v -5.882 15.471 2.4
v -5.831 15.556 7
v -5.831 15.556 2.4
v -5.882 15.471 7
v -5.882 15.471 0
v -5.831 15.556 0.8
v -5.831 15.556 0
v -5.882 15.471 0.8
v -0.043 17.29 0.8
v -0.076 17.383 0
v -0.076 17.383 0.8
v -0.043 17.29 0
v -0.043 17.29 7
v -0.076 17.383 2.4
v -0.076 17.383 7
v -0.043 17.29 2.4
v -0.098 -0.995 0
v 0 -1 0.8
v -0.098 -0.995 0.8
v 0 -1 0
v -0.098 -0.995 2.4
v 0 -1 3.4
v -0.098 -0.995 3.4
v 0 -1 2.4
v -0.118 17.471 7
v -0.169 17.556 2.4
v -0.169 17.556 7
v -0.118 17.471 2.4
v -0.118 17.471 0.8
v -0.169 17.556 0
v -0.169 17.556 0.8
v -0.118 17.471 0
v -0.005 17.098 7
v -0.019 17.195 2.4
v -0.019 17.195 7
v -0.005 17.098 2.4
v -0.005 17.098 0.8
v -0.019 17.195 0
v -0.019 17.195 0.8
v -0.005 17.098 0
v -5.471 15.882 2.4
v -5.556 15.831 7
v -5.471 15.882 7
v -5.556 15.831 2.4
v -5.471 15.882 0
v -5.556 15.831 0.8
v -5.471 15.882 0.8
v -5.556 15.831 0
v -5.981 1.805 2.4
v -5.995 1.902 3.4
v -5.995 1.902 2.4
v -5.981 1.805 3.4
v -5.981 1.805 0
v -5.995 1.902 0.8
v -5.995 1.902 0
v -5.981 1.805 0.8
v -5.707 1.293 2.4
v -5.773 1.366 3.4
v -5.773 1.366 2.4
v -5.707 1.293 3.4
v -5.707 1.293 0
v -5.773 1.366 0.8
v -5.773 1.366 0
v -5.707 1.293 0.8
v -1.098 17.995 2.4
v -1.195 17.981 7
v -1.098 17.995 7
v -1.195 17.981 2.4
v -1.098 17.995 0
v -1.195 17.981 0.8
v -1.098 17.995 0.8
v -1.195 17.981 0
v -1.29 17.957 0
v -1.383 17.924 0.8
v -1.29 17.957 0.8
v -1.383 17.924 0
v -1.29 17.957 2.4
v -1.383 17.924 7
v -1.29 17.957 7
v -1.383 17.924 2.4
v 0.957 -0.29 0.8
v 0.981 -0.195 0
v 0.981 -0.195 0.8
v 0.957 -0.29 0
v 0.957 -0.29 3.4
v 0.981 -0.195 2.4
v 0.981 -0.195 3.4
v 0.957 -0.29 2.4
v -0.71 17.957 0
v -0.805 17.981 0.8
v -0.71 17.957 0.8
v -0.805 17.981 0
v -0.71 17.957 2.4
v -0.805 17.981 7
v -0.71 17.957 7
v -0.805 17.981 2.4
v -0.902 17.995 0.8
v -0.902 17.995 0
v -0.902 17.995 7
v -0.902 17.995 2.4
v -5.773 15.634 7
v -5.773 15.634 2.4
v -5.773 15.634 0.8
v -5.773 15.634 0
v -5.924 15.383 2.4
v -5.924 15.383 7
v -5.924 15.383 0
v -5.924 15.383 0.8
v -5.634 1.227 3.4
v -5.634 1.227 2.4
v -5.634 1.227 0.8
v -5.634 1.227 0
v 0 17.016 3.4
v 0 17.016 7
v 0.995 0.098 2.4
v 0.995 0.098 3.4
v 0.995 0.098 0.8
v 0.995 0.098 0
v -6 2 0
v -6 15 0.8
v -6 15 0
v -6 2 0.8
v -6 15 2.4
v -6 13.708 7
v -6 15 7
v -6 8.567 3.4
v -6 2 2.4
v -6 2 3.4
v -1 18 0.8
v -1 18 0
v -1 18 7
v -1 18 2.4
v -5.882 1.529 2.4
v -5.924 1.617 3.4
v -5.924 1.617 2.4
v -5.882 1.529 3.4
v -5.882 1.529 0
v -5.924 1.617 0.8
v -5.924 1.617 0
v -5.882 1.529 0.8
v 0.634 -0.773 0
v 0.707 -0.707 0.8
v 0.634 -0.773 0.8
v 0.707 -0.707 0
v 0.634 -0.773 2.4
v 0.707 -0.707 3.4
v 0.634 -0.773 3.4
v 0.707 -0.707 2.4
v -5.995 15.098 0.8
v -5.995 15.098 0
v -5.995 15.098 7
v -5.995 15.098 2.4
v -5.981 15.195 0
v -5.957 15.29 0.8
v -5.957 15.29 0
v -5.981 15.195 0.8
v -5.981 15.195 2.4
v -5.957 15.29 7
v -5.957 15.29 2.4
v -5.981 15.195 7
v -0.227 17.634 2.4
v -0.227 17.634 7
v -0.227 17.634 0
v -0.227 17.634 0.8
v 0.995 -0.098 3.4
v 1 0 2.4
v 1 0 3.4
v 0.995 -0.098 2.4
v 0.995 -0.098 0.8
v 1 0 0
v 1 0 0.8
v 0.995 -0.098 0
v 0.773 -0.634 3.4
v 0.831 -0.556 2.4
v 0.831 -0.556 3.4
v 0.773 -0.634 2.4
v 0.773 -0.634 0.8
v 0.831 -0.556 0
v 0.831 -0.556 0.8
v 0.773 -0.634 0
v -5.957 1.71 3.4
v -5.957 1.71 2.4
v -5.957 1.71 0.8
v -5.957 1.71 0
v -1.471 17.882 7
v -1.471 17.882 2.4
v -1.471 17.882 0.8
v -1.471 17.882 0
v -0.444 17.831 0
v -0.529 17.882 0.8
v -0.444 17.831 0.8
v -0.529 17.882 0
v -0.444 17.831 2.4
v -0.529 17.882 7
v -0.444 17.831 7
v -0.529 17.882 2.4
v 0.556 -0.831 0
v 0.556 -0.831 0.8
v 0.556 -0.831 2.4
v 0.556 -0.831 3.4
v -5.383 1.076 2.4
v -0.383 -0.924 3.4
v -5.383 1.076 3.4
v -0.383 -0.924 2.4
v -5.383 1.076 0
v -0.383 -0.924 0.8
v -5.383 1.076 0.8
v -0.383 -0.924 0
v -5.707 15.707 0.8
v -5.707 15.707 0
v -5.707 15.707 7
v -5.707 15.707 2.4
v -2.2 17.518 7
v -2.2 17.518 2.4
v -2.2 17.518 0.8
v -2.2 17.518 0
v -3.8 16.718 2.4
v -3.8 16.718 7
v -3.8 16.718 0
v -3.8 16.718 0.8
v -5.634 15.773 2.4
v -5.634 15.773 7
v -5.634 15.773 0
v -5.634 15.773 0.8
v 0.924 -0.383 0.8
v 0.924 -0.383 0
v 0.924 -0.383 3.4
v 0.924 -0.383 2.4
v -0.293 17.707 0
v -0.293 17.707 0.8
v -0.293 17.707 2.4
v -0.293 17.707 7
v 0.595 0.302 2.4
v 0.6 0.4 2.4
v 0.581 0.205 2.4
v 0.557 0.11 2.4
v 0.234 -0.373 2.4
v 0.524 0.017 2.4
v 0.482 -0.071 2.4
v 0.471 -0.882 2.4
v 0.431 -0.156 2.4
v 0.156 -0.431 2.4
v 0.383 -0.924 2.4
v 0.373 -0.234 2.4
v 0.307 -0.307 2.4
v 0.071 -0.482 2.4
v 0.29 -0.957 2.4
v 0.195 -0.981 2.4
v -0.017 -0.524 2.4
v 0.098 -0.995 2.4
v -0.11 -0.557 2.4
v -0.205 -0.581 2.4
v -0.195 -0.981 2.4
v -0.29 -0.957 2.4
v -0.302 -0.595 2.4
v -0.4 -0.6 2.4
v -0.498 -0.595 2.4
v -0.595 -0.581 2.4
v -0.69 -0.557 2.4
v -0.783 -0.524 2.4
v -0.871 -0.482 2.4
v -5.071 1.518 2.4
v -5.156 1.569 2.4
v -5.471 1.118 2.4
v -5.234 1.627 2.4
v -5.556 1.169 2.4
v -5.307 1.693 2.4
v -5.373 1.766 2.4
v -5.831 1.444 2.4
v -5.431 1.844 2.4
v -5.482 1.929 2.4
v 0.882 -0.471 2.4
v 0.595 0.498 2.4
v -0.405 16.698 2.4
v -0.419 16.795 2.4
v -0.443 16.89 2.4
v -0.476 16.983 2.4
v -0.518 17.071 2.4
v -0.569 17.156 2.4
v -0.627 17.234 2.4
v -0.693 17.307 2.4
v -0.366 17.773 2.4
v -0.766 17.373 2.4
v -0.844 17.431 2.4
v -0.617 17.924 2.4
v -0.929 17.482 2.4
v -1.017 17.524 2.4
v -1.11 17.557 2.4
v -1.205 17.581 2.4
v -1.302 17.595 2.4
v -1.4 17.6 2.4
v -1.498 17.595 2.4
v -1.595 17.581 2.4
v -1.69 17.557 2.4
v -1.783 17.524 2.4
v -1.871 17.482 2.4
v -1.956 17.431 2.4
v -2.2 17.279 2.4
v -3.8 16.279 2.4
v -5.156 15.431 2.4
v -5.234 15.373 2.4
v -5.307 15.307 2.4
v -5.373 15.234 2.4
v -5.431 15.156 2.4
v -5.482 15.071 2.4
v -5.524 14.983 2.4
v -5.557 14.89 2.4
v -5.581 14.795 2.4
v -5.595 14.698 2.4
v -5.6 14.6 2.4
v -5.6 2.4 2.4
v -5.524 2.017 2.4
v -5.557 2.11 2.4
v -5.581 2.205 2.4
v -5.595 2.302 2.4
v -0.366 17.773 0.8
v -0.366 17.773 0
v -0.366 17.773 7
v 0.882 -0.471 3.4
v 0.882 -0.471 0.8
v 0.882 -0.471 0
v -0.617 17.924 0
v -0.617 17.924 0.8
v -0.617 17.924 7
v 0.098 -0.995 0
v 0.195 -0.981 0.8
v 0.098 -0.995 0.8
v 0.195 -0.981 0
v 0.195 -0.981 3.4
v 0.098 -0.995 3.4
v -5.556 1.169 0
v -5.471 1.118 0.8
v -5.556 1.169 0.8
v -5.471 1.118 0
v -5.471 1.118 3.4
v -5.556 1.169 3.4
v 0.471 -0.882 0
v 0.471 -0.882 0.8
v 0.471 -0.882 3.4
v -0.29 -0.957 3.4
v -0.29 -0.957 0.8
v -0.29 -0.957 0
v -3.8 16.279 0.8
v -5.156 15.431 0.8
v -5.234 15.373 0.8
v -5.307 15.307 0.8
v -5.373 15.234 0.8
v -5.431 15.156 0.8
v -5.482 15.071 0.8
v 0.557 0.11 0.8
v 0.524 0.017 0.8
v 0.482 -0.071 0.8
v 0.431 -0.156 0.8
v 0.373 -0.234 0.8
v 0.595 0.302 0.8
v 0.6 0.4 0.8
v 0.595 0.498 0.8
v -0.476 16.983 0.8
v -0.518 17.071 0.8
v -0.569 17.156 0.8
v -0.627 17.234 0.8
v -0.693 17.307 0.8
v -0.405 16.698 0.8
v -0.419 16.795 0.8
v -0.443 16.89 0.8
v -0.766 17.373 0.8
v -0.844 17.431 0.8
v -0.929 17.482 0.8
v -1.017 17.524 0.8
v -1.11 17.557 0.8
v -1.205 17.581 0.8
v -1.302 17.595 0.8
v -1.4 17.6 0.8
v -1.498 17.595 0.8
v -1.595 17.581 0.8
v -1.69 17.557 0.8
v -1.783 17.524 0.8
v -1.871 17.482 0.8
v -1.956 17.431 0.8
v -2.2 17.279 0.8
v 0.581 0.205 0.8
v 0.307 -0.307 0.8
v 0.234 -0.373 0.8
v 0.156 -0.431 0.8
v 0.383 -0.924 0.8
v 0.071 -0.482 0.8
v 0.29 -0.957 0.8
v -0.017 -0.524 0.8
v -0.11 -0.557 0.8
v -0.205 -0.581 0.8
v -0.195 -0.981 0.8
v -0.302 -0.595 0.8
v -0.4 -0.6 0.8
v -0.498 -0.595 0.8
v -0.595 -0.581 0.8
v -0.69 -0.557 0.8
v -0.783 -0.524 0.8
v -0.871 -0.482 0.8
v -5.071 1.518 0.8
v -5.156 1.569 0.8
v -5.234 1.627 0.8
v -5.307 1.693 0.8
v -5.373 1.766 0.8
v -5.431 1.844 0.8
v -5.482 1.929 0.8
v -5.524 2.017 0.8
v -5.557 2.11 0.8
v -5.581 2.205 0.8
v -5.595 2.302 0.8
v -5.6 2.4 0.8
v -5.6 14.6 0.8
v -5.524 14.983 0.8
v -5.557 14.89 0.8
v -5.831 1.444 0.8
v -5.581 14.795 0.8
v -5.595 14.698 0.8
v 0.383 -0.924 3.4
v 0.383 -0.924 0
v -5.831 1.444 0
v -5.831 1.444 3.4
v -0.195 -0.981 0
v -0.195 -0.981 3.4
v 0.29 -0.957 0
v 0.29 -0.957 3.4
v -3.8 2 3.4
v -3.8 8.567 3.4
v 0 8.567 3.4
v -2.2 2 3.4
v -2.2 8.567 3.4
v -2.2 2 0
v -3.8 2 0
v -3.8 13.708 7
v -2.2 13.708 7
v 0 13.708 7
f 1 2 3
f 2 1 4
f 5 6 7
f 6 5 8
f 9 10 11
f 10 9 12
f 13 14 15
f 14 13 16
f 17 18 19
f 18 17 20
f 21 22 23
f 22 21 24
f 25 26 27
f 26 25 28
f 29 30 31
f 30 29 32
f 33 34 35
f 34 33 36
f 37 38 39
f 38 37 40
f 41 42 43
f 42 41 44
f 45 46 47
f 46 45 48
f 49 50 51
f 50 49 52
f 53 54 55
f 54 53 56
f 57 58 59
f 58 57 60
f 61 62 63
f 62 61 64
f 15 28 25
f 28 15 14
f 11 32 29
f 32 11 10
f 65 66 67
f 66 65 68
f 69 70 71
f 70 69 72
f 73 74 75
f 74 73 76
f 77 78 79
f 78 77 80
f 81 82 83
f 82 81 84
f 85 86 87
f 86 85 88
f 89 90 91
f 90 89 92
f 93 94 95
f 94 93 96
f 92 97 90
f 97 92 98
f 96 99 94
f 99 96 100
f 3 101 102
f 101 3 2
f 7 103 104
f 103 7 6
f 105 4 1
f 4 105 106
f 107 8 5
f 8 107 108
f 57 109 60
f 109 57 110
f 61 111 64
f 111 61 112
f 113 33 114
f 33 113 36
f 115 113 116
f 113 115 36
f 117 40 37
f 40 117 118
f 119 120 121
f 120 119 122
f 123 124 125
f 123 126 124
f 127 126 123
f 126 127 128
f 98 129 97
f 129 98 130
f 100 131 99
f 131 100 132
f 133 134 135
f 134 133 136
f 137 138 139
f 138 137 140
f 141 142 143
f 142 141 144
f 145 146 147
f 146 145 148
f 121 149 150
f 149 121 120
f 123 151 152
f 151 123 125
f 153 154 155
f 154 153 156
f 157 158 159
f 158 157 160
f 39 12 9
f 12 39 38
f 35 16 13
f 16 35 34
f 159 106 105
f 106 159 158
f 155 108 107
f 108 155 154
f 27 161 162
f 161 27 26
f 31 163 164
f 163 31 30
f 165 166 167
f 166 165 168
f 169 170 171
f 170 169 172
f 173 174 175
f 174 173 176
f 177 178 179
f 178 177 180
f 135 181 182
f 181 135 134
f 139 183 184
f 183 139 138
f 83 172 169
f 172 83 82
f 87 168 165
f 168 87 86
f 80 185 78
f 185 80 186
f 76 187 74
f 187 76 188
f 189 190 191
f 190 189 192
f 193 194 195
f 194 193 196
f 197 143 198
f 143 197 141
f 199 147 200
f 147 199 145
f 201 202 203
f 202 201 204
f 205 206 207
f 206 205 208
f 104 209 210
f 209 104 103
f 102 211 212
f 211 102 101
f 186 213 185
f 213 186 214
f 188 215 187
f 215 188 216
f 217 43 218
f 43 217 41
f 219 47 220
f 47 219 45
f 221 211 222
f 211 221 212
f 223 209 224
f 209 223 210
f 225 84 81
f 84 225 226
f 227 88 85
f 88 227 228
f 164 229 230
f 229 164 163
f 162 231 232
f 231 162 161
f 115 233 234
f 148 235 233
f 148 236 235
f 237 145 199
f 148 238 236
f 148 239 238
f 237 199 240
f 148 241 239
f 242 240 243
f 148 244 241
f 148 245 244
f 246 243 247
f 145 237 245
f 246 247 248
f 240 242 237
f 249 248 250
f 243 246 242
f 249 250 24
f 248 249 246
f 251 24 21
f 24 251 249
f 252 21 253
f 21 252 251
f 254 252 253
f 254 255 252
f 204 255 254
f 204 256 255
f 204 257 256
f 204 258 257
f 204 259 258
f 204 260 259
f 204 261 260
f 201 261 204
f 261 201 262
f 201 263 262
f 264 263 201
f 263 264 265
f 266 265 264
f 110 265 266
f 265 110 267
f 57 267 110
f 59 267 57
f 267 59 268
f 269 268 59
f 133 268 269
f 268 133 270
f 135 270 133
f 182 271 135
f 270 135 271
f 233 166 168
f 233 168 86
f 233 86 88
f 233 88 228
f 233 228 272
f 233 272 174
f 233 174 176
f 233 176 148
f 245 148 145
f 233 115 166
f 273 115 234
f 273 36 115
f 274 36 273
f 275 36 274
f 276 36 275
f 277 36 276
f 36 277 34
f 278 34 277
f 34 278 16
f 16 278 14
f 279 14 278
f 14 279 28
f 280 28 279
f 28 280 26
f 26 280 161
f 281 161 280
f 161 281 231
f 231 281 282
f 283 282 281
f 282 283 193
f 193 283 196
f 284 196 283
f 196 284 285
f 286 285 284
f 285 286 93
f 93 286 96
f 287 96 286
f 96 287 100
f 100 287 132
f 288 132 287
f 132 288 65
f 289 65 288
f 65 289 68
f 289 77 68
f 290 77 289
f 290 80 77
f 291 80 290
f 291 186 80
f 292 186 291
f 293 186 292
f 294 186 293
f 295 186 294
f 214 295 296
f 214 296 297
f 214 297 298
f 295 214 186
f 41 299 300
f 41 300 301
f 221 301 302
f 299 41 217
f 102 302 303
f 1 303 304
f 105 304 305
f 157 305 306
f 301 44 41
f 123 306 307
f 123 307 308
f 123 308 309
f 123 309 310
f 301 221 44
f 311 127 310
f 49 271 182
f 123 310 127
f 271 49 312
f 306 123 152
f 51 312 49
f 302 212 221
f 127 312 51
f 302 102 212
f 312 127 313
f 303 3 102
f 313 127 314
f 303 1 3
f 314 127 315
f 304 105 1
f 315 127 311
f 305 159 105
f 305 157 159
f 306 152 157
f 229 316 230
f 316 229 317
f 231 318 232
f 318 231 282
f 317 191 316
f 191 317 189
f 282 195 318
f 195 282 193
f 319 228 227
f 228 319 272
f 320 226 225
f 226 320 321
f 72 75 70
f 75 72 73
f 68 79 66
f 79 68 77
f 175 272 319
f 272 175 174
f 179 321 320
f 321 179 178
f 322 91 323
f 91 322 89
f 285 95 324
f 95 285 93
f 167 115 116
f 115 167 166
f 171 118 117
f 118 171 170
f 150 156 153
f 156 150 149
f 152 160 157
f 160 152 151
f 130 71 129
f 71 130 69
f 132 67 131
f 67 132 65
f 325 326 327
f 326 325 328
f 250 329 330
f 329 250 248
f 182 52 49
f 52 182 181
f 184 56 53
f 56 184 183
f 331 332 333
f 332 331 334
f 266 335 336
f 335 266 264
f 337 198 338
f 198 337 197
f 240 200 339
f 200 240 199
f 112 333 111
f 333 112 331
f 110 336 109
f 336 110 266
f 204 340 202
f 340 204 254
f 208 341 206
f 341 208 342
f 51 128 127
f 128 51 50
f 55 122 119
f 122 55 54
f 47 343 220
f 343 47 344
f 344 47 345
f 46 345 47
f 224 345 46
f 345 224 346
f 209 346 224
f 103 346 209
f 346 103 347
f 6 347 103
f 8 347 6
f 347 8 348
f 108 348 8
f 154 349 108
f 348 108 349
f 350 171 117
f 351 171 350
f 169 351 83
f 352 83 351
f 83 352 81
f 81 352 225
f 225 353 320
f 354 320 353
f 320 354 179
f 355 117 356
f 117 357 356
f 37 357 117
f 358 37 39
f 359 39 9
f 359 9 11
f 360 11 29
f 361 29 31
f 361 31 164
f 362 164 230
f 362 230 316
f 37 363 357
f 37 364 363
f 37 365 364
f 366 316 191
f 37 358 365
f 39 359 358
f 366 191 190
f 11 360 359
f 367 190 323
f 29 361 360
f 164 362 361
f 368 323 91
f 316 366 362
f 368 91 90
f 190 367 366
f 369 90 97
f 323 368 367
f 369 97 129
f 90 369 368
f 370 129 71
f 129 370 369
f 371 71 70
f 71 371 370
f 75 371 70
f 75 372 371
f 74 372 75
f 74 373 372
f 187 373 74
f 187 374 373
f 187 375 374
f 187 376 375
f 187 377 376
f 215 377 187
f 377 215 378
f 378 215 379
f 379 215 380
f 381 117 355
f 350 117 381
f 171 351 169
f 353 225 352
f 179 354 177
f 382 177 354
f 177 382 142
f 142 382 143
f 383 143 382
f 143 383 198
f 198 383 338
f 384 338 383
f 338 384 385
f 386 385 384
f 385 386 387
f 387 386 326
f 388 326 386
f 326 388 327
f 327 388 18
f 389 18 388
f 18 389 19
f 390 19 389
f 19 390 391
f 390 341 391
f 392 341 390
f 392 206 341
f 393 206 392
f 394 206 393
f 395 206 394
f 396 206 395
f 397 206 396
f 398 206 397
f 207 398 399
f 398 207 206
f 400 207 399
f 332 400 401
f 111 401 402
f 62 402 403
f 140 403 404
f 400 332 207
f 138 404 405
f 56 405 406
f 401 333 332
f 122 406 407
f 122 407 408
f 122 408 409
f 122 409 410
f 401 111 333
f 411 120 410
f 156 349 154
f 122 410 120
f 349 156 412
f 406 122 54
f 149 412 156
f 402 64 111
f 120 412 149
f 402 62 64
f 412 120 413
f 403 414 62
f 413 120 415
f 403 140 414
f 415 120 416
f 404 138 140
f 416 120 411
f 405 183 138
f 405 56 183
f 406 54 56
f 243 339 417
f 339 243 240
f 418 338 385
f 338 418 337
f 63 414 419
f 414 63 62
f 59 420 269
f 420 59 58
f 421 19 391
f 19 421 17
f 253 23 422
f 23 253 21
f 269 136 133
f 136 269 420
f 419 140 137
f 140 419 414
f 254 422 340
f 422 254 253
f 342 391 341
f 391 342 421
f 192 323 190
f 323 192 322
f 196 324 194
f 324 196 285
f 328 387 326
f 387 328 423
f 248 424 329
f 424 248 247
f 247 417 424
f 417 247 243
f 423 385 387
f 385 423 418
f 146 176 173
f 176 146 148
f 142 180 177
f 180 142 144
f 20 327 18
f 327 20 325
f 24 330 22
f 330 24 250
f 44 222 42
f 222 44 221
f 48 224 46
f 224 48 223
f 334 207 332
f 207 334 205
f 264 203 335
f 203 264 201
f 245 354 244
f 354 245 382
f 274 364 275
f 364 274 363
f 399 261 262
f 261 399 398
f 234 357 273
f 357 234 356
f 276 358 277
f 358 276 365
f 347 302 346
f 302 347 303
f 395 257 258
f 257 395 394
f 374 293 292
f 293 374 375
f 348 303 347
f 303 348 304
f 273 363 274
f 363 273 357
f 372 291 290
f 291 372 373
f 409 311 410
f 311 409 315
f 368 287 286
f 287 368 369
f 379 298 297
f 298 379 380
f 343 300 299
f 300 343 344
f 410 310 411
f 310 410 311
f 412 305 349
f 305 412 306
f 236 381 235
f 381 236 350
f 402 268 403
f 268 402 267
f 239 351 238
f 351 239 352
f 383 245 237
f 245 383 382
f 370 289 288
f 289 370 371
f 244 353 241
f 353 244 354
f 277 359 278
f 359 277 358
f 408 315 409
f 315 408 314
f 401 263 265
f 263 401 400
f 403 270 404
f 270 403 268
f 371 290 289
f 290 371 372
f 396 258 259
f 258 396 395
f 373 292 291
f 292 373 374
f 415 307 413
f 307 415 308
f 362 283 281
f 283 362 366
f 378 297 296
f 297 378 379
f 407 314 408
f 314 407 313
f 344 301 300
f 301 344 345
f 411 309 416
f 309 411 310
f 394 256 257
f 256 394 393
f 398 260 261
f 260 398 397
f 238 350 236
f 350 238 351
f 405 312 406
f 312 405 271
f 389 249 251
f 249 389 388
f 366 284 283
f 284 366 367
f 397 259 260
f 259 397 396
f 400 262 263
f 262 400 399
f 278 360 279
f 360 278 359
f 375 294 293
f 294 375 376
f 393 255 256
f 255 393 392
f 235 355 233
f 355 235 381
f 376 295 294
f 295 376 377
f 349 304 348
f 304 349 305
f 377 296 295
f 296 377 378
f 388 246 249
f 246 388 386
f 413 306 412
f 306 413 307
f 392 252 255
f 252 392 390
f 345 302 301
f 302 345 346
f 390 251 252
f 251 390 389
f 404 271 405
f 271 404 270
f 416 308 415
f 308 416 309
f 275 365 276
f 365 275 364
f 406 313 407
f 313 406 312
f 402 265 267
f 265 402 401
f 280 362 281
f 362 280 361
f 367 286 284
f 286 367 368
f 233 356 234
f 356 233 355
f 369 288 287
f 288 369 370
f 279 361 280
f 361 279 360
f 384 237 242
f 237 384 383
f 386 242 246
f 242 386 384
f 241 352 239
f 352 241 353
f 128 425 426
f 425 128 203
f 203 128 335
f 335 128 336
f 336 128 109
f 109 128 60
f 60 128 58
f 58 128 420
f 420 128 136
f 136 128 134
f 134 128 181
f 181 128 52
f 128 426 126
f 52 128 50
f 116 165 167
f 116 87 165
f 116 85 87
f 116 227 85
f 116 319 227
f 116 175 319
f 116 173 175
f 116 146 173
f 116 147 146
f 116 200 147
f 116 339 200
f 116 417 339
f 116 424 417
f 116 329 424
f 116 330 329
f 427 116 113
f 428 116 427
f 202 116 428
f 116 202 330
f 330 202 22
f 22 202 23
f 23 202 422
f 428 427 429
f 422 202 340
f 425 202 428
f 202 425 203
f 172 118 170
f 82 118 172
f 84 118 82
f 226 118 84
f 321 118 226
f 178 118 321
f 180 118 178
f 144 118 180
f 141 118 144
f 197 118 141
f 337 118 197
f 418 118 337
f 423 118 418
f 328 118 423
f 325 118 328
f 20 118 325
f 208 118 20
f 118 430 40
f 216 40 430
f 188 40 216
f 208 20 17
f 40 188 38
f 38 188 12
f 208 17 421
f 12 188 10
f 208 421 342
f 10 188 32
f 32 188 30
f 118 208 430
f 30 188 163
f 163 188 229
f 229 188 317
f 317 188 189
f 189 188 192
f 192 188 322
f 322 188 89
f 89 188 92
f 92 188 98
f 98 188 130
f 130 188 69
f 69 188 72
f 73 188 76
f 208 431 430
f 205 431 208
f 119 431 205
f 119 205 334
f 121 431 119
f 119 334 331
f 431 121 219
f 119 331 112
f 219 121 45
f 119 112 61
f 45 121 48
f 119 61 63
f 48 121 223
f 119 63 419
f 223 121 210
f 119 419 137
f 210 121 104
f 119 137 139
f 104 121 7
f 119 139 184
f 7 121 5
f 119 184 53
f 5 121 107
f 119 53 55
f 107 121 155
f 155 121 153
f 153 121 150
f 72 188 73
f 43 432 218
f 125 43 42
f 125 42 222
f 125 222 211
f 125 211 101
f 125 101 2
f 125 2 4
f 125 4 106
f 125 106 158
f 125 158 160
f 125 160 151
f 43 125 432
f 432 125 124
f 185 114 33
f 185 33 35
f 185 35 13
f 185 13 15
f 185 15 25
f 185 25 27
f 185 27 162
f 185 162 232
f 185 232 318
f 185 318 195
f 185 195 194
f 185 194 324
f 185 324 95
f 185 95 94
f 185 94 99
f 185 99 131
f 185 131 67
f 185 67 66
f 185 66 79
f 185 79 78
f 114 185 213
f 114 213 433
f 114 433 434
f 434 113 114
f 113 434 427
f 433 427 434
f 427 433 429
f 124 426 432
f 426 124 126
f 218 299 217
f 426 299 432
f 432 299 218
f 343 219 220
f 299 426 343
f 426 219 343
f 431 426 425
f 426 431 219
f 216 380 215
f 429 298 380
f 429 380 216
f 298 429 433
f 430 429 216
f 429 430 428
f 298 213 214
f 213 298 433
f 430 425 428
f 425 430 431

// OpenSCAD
$fn = 64;
module plate(h = 3.4) {
  x1 = 1;
  x2 = 5;
  y1 = 17;
  y2 = 15;
  y3 = 2;
  ins = 1.6;
  difference() {
    hull() {
      translate([x2, y3, 0]) {
        cylinder(h = h, r = 1);
      }
      translate([x1, y1, 0]) {
        cylinder(h = h, r = 1);
      }
      translate([x2, y2, 0]) {
        cylinder(h = h, r = 1);
      }
      translate([0, 0, 0]) {
        cylinder(h = h, r = 1);
      }
    }
    shift = 0.4;
    translate([0, 0, 0.8]) {
      difference() {
        hull() {
          translate([x2, y3, 0]) {
            cylinder(h = ins, r = 1);
          }
          translate([x1, y1, 0]) {
            cylinder(h = ins, r = 1);
          }
          translate([x2, y2, 0]) {
            cylinder(h = ins, r = 1);
          }
          translate([0, 0, 0]) {
            cylinder(h = ins, r = 1);
          }
        }
        hull() {
          translate([x2 - shift, y3 + shift, 0]) {
            cylinder(h = ins, r = 1);
          }
          translate([x1 + shift, y1 - shift, 0]) {
            cylinder(h = ins, r = 1);
          }
          translate([x2 - shift, y2 - shift, 0]) {
            cylinder(h = ins, r = 1);
          }
          translate([shift, shift, 0]) {
            cylinder(h = ins, r = 1);
          }
        }
      }
    }
  }
}

angle = 35;

// module standoff(cut = true) {
//   translate([2.86, 8, -5]) {
//     intersection() {
//       rotate(angle, [-1, 0, 0]) {
//         difference() {
//           cylinder(h = 5 + 10, r = 2.8);
//           if (cut) {
//             cylinder(h = 10 + 10, r = 2.1);
//           }
//         }
//       }

//       translate([-5, -5, 5]) {
//         cube([10, 15, 50]);
//       }
//     }
//   }
// }

mirror([1, 0, 0]) {
  difference() {
    union() {
      plate(h = 3.4);
      intersection() {
        translate([0, 11, -1]) {
          rotate(angle, [1, 0, 0]) {
            translate([0, 0, -40]) {
              cube([8, 50, 45]);
            }
          }
        }
        union() {
          plate(h = 7);
        }
      }

      // standoff(cut = false);
      // standoff();
    }
    translate([2.2, 2, 0]) {
      // rotate(angle, [-1, 0, 0]) {
      cube([1.6, 55, 50]);
      // }
    }
  }
}
